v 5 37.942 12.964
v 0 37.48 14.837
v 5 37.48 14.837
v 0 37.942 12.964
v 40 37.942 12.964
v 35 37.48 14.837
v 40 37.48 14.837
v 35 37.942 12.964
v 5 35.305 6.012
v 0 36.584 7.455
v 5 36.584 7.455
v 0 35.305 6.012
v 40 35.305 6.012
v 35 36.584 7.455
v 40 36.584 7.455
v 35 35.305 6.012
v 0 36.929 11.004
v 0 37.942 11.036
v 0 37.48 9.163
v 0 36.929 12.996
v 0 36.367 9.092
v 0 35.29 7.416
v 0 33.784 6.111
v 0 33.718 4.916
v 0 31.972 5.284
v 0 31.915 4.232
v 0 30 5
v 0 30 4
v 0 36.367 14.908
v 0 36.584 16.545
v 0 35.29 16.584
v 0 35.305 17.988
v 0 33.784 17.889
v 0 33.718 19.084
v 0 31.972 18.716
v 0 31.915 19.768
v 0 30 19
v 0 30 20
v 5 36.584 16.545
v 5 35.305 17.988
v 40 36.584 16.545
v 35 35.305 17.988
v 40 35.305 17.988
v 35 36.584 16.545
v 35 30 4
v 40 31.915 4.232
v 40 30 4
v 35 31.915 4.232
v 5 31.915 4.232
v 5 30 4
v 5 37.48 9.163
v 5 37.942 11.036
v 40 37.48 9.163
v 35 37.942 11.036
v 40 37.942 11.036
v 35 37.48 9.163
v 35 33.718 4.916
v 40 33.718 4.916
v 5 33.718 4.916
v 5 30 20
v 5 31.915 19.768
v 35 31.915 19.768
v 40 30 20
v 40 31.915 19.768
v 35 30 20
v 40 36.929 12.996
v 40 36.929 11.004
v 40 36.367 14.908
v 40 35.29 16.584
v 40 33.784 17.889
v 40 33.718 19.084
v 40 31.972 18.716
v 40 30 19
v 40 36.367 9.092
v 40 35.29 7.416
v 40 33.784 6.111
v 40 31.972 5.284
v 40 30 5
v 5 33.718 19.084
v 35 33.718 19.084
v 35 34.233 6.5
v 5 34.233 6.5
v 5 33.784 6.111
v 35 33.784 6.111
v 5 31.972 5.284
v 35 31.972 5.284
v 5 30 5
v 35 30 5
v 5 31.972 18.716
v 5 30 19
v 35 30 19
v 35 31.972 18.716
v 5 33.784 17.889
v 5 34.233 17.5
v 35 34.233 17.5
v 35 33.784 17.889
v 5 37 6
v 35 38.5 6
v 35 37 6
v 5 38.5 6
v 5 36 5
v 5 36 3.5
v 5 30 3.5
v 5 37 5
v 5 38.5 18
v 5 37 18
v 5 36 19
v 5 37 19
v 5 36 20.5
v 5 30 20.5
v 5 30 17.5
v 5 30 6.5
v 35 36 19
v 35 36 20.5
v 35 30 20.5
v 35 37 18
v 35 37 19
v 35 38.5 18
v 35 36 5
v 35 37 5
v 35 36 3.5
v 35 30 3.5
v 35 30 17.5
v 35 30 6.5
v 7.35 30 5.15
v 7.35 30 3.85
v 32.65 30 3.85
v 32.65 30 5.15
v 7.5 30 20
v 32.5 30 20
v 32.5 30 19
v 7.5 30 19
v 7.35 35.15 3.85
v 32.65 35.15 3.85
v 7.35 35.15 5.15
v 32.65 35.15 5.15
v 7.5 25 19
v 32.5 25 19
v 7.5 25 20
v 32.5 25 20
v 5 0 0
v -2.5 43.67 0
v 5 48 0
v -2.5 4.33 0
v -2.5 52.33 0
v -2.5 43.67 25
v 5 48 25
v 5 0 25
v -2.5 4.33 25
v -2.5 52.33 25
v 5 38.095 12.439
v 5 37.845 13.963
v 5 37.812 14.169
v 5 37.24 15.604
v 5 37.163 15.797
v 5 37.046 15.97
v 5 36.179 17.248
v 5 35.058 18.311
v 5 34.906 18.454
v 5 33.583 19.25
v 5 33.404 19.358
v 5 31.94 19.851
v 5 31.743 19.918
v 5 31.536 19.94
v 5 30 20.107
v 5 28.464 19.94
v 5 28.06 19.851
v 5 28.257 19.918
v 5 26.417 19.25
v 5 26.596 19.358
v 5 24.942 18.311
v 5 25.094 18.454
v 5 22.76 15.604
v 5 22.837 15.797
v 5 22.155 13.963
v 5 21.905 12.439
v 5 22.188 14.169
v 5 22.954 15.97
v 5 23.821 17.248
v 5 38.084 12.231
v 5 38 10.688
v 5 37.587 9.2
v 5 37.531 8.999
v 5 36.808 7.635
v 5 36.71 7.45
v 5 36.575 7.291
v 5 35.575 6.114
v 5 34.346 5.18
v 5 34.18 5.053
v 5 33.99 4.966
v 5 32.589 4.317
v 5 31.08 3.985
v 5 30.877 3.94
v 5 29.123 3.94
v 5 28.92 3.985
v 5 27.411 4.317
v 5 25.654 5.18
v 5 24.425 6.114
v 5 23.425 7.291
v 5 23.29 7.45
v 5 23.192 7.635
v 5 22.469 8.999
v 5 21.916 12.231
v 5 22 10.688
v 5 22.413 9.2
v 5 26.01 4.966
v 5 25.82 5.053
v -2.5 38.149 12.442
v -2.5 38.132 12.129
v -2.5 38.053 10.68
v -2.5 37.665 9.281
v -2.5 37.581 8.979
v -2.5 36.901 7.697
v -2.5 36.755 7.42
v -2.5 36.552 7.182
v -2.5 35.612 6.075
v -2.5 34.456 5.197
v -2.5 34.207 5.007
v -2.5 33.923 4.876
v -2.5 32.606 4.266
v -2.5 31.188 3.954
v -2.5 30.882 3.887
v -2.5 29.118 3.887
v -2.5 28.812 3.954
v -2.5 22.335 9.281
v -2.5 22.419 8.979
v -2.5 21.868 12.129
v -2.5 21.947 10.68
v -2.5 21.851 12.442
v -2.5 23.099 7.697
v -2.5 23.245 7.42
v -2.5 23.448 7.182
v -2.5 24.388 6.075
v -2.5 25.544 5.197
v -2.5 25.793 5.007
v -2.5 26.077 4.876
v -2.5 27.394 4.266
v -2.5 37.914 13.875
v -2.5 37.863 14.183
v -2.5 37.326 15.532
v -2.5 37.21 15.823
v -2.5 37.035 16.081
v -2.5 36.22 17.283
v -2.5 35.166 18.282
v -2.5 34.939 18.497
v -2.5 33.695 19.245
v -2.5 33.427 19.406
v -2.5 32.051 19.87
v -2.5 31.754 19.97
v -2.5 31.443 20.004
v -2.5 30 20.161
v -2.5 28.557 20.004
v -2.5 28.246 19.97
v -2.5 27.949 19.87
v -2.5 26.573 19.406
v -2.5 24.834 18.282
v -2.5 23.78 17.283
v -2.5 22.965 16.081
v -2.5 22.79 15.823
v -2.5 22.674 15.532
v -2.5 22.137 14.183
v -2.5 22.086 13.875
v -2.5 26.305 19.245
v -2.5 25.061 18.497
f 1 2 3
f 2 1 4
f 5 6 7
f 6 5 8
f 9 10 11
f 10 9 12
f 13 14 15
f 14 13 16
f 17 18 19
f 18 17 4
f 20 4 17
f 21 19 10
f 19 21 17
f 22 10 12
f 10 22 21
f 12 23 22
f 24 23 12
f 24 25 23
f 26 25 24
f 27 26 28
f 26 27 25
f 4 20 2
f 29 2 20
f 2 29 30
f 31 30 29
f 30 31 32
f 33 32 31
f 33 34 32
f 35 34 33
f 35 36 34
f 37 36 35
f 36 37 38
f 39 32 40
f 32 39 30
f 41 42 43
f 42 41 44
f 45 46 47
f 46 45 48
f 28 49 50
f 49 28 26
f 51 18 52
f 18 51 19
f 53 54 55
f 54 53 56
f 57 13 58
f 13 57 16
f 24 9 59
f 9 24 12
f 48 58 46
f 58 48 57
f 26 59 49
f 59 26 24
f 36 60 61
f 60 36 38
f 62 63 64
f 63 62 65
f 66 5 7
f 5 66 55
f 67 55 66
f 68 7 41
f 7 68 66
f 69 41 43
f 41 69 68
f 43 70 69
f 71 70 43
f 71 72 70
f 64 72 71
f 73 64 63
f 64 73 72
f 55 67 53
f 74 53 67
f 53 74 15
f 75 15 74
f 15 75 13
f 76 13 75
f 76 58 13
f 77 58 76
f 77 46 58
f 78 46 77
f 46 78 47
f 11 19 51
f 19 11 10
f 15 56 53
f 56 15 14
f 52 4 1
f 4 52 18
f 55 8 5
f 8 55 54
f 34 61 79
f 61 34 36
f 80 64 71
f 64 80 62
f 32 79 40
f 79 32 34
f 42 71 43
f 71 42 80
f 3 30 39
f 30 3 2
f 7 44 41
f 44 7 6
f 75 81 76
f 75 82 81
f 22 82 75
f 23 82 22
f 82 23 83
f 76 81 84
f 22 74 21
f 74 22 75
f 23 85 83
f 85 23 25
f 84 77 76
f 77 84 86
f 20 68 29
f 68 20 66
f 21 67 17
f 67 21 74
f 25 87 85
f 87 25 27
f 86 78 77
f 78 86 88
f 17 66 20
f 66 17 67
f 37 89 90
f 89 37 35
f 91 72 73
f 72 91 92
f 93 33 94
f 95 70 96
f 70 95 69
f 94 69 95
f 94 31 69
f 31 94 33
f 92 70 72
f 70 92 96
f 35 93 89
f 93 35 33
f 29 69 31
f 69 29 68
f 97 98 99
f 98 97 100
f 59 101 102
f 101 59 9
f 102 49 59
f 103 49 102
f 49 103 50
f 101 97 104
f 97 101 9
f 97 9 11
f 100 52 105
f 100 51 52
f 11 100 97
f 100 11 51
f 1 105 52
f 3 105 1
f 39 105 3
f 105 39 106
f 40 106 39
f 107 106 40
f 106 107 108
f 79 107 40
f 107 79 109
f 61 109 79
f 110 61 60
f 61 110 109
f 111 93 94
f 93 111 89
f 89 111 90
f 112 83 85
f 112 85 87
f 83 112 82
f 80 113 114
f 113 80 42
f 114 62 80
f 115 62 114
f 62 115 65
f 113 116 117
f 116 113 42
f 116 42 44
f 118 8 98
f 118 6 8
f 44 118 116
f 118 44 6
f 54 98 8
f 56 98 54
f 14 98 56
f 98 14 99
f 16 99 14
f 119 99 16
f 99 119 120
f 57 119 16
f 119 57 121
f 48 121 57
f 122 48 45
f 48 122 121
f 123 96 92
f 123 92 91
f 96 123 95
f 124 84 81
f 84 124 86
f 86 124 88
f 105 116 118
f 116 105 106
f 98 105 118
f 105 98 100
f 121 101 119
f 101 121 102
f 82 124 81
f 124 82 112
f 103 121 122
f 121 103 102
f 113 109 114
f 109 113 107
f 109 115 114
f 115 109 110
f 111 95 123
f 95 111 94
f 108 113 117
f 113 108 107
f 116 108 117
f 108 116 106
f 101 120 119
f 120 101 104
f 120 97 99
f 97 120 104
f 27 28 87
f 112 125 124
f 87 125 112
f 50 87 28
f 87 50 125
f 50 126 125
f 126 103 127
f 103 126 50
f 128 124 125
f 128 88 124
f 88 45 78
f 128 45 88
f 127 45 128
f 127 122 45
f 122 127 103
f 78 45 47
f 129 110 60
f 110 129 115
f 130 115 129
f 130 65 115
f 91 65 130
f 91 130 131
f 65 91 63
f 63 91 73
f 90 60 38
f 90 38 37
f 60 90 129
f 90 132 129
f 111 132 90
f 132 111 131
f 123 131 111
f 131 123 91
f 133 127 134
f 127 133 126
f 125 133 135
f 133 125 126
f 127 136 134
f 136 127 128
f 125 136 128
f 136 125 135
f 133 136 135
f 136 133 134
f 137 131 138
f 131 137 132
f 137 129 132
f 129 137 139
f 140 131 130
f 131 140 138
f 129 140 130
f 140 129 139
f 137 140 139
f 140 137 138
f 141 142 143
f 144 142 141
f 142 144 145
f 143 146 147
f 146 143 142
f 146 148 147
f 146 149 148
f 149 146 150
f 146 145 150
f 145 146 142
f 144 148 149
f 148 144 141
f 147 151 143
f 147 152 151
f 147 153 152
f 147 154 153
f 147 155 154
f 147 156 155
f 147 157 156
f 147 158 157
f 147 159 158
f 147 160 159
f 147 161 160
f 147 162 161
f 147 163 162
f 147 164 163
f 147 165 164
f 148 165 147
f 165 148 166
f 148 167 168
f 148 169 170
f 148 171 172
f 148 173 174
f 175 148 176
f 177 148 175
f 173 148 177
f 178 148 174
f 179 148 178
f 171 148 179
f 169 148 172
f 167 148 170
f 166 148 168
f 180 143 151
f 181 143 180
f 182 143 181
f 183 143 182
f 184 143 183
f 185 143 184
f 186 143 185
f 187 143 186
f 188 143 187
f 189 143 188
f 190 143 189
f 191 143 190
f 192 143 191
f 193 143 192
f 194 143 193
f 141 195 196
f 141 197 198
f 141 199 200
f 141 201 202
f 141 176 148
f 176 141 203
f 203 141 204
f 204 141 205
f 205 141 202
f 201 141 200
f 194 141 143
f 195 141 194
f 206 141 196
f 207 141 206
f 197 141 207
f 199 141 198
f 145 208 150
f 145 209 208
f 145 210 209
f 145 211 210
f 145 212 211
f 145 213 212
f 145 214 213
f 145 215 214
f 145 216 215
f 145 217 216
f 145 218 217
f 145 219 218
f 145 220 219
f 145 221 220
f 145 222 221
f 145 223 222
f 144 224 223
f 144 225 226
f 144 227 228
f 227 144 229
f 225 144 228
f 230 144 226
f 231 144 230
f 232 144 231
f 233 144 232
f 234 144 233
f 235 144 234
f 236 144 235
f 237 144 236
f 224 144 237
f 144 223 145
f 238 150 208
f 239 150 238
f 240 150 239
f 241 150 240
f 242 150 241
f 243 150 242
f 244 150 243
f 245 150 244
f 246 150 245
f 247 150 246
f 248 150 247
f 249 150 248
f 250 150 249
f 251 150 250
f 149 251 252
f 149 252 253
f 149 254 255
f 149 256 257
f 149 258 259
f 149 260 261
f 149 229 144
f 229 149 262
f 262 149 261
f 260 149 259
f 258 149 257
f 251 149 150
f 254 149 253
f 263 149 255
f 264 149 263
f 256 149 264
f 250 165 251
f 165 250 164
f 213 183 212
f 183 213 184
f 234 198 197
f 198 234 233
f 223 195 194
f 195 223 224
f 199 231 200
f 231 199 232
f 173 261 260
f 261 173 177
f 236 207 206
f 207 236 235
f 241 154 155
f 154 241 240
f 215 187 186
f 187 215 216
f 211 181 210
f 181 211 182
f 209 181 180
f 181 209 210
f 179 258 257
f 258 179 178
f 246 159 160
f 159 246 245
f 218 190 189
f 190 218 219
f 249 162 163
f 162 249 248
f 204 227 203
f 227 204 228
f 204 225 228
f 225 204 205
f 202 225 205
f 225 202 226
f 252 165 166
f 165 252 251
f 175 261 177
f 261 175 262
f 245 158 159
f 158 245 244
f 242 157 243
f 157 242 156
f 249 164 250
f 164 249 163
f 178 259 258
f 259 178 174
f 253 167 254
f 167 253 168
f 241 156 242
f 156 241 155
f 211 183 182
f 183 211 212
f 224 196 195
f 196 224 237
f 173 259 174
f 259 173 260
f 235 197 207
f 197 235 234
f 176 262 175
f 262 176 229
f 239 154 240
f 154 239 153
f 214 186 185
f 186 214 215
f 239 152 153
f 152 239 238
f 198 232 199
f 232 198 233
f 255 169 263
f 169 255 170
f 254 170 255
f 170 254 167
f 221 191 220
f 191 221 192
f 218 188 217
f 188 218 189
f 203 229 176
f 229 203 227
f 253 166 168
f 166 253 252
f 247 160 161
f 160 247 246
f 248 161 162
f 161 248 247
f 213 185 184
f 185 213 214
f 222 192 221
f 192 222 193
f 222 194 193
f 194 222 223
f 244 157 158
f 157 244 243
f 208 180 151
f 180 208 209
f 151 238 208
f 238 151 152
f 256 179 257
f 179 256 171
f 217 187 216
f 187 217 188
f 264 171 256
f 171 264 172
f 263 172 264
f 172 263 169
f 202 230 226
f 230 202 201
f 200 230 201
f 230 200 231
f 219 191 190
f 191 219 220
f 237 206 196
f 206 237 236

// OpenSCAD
// file: joiner.scad
// these modular units are printed as pairs according to their shearing. they
// are unoriented; it is sufficient to print two copies of one half. looking out
// into the open face, the left side is male, and the right side is female. the
// fastener is split into thirds, with the male insert in the middle.abs
//
// we need be able to snap in components (rather than sliding them in).
tabheight = 3;

// the model total unit is 50mm long. a central circle has four rectangular
// sections at its compass points. two are simple; the other two are fasteners.
// all lie 5mm in from the sides.
unitlength = 50;
margin = 5;

r = 8;
d = 2 * r;
pwidth = r * 2 - 4;

module rod(l) {
  cube([1, 1, l]);
}

// we're missing our top, which is where a pairing will sit
module dunit(length) {
  plength = length - margin * 2;
  difference(){
    union(){
      difference(){
        cylinder(length, r, r, true);
        // cut out the core
        cylinder(length, r - 1, r - 1, true);
      }
      difference(){
        translate([0, -(r - 1), 0]){
          cube([pwidth, tabheight, plength], true);
        }
        cylinder(length, r, r, true);
      }
      difference(){
        rotate([0, 0, 90]){
          translate([0, -(r - 1), 0]){
            cube([pwidth, tabheight, plength], true);
          }
        }
      }
      difference(){
        translate([-(r - 1), 0, 0]){
          rotate([0, 0, 90]){
            cube([pwidth, tabheight, plength], true);
          }
        }
      }
      translate([-pwidth / 2 - 1, -pwidth / 2 - 1, -plength / 2]){
        rod(plength);
      }
      translate([pwidth / 2, -pwidth / 2 - 1, -plength / 2]){
        rod(plength);
      }
    }
    union(){
      // cut off the top
      translate([-(d + tabheight) / 2, 0, -length / 2]){
        cube([d + tabheight, r, length]);
      }
      // female receptacle on right (looking up)
      give = 0.3;
      translate([r - tabheight / 3 - give / 2,
                 -(pwidth + give) / 2 + 1,
                 -(plength - margin + give) / 2]){
        cube([tabheight / 3 + give,
              pwidth / 2 - 1 + give,
              plength - margin + give]);
      }
    }
  }
  // male fitting on left (looking up)
  translate([-r, 0, -(plength - margin) / 2]){
    cube([tabheight / 3, pwidth / 2 - 1, plength - margin]);
  }
}

module shearAlongX(p) {
  multmatrix([
    [1, 0, 0, 0],
    [p.y / p.x, 1, 0, 0],
    [p.z / p.x, 0, 1, 0]
  ]) children();
}

module fchunk(height, sidew){
  translate([-20, height - 10, sidew - 28]){
    rotate([180, 90, 0]){
      dunit(40);
    }
  }
}
// file: wedge.scad
// wedge to lock into cage channels for sata cables
use <MCAD/regular_shapes.scad>
module satawedge(){
    difference(){
        hull(){
            translate([0, 48, 0]){
                rotate([0, 0, 30]){
                    triangle_prism(25, 5);
                }                   
            }
            rotate([0, 0, 30]){ 
                triangle_prism(25, 5);
            }
        }
        union(){
            translate([0, 48, 0]){
                rotate([0, 0, 30]){
                    triangle_prism(25, 5);
                }                   
            }
            rotate([0, 0, 30]){ 
                triangle_prism(25, 5);
            }
        }
    }
}
// main file
use <wedge.scad>
use <joiner.scad>

translate([40, 30, 39]){
    fchunk(10, 1);
}
difference(){
    satawedge();
    translate([20, 30, 12]){
        rotate([0, 270, 0]){
            cylinder(140, 8, 9);
        }
    }
}
